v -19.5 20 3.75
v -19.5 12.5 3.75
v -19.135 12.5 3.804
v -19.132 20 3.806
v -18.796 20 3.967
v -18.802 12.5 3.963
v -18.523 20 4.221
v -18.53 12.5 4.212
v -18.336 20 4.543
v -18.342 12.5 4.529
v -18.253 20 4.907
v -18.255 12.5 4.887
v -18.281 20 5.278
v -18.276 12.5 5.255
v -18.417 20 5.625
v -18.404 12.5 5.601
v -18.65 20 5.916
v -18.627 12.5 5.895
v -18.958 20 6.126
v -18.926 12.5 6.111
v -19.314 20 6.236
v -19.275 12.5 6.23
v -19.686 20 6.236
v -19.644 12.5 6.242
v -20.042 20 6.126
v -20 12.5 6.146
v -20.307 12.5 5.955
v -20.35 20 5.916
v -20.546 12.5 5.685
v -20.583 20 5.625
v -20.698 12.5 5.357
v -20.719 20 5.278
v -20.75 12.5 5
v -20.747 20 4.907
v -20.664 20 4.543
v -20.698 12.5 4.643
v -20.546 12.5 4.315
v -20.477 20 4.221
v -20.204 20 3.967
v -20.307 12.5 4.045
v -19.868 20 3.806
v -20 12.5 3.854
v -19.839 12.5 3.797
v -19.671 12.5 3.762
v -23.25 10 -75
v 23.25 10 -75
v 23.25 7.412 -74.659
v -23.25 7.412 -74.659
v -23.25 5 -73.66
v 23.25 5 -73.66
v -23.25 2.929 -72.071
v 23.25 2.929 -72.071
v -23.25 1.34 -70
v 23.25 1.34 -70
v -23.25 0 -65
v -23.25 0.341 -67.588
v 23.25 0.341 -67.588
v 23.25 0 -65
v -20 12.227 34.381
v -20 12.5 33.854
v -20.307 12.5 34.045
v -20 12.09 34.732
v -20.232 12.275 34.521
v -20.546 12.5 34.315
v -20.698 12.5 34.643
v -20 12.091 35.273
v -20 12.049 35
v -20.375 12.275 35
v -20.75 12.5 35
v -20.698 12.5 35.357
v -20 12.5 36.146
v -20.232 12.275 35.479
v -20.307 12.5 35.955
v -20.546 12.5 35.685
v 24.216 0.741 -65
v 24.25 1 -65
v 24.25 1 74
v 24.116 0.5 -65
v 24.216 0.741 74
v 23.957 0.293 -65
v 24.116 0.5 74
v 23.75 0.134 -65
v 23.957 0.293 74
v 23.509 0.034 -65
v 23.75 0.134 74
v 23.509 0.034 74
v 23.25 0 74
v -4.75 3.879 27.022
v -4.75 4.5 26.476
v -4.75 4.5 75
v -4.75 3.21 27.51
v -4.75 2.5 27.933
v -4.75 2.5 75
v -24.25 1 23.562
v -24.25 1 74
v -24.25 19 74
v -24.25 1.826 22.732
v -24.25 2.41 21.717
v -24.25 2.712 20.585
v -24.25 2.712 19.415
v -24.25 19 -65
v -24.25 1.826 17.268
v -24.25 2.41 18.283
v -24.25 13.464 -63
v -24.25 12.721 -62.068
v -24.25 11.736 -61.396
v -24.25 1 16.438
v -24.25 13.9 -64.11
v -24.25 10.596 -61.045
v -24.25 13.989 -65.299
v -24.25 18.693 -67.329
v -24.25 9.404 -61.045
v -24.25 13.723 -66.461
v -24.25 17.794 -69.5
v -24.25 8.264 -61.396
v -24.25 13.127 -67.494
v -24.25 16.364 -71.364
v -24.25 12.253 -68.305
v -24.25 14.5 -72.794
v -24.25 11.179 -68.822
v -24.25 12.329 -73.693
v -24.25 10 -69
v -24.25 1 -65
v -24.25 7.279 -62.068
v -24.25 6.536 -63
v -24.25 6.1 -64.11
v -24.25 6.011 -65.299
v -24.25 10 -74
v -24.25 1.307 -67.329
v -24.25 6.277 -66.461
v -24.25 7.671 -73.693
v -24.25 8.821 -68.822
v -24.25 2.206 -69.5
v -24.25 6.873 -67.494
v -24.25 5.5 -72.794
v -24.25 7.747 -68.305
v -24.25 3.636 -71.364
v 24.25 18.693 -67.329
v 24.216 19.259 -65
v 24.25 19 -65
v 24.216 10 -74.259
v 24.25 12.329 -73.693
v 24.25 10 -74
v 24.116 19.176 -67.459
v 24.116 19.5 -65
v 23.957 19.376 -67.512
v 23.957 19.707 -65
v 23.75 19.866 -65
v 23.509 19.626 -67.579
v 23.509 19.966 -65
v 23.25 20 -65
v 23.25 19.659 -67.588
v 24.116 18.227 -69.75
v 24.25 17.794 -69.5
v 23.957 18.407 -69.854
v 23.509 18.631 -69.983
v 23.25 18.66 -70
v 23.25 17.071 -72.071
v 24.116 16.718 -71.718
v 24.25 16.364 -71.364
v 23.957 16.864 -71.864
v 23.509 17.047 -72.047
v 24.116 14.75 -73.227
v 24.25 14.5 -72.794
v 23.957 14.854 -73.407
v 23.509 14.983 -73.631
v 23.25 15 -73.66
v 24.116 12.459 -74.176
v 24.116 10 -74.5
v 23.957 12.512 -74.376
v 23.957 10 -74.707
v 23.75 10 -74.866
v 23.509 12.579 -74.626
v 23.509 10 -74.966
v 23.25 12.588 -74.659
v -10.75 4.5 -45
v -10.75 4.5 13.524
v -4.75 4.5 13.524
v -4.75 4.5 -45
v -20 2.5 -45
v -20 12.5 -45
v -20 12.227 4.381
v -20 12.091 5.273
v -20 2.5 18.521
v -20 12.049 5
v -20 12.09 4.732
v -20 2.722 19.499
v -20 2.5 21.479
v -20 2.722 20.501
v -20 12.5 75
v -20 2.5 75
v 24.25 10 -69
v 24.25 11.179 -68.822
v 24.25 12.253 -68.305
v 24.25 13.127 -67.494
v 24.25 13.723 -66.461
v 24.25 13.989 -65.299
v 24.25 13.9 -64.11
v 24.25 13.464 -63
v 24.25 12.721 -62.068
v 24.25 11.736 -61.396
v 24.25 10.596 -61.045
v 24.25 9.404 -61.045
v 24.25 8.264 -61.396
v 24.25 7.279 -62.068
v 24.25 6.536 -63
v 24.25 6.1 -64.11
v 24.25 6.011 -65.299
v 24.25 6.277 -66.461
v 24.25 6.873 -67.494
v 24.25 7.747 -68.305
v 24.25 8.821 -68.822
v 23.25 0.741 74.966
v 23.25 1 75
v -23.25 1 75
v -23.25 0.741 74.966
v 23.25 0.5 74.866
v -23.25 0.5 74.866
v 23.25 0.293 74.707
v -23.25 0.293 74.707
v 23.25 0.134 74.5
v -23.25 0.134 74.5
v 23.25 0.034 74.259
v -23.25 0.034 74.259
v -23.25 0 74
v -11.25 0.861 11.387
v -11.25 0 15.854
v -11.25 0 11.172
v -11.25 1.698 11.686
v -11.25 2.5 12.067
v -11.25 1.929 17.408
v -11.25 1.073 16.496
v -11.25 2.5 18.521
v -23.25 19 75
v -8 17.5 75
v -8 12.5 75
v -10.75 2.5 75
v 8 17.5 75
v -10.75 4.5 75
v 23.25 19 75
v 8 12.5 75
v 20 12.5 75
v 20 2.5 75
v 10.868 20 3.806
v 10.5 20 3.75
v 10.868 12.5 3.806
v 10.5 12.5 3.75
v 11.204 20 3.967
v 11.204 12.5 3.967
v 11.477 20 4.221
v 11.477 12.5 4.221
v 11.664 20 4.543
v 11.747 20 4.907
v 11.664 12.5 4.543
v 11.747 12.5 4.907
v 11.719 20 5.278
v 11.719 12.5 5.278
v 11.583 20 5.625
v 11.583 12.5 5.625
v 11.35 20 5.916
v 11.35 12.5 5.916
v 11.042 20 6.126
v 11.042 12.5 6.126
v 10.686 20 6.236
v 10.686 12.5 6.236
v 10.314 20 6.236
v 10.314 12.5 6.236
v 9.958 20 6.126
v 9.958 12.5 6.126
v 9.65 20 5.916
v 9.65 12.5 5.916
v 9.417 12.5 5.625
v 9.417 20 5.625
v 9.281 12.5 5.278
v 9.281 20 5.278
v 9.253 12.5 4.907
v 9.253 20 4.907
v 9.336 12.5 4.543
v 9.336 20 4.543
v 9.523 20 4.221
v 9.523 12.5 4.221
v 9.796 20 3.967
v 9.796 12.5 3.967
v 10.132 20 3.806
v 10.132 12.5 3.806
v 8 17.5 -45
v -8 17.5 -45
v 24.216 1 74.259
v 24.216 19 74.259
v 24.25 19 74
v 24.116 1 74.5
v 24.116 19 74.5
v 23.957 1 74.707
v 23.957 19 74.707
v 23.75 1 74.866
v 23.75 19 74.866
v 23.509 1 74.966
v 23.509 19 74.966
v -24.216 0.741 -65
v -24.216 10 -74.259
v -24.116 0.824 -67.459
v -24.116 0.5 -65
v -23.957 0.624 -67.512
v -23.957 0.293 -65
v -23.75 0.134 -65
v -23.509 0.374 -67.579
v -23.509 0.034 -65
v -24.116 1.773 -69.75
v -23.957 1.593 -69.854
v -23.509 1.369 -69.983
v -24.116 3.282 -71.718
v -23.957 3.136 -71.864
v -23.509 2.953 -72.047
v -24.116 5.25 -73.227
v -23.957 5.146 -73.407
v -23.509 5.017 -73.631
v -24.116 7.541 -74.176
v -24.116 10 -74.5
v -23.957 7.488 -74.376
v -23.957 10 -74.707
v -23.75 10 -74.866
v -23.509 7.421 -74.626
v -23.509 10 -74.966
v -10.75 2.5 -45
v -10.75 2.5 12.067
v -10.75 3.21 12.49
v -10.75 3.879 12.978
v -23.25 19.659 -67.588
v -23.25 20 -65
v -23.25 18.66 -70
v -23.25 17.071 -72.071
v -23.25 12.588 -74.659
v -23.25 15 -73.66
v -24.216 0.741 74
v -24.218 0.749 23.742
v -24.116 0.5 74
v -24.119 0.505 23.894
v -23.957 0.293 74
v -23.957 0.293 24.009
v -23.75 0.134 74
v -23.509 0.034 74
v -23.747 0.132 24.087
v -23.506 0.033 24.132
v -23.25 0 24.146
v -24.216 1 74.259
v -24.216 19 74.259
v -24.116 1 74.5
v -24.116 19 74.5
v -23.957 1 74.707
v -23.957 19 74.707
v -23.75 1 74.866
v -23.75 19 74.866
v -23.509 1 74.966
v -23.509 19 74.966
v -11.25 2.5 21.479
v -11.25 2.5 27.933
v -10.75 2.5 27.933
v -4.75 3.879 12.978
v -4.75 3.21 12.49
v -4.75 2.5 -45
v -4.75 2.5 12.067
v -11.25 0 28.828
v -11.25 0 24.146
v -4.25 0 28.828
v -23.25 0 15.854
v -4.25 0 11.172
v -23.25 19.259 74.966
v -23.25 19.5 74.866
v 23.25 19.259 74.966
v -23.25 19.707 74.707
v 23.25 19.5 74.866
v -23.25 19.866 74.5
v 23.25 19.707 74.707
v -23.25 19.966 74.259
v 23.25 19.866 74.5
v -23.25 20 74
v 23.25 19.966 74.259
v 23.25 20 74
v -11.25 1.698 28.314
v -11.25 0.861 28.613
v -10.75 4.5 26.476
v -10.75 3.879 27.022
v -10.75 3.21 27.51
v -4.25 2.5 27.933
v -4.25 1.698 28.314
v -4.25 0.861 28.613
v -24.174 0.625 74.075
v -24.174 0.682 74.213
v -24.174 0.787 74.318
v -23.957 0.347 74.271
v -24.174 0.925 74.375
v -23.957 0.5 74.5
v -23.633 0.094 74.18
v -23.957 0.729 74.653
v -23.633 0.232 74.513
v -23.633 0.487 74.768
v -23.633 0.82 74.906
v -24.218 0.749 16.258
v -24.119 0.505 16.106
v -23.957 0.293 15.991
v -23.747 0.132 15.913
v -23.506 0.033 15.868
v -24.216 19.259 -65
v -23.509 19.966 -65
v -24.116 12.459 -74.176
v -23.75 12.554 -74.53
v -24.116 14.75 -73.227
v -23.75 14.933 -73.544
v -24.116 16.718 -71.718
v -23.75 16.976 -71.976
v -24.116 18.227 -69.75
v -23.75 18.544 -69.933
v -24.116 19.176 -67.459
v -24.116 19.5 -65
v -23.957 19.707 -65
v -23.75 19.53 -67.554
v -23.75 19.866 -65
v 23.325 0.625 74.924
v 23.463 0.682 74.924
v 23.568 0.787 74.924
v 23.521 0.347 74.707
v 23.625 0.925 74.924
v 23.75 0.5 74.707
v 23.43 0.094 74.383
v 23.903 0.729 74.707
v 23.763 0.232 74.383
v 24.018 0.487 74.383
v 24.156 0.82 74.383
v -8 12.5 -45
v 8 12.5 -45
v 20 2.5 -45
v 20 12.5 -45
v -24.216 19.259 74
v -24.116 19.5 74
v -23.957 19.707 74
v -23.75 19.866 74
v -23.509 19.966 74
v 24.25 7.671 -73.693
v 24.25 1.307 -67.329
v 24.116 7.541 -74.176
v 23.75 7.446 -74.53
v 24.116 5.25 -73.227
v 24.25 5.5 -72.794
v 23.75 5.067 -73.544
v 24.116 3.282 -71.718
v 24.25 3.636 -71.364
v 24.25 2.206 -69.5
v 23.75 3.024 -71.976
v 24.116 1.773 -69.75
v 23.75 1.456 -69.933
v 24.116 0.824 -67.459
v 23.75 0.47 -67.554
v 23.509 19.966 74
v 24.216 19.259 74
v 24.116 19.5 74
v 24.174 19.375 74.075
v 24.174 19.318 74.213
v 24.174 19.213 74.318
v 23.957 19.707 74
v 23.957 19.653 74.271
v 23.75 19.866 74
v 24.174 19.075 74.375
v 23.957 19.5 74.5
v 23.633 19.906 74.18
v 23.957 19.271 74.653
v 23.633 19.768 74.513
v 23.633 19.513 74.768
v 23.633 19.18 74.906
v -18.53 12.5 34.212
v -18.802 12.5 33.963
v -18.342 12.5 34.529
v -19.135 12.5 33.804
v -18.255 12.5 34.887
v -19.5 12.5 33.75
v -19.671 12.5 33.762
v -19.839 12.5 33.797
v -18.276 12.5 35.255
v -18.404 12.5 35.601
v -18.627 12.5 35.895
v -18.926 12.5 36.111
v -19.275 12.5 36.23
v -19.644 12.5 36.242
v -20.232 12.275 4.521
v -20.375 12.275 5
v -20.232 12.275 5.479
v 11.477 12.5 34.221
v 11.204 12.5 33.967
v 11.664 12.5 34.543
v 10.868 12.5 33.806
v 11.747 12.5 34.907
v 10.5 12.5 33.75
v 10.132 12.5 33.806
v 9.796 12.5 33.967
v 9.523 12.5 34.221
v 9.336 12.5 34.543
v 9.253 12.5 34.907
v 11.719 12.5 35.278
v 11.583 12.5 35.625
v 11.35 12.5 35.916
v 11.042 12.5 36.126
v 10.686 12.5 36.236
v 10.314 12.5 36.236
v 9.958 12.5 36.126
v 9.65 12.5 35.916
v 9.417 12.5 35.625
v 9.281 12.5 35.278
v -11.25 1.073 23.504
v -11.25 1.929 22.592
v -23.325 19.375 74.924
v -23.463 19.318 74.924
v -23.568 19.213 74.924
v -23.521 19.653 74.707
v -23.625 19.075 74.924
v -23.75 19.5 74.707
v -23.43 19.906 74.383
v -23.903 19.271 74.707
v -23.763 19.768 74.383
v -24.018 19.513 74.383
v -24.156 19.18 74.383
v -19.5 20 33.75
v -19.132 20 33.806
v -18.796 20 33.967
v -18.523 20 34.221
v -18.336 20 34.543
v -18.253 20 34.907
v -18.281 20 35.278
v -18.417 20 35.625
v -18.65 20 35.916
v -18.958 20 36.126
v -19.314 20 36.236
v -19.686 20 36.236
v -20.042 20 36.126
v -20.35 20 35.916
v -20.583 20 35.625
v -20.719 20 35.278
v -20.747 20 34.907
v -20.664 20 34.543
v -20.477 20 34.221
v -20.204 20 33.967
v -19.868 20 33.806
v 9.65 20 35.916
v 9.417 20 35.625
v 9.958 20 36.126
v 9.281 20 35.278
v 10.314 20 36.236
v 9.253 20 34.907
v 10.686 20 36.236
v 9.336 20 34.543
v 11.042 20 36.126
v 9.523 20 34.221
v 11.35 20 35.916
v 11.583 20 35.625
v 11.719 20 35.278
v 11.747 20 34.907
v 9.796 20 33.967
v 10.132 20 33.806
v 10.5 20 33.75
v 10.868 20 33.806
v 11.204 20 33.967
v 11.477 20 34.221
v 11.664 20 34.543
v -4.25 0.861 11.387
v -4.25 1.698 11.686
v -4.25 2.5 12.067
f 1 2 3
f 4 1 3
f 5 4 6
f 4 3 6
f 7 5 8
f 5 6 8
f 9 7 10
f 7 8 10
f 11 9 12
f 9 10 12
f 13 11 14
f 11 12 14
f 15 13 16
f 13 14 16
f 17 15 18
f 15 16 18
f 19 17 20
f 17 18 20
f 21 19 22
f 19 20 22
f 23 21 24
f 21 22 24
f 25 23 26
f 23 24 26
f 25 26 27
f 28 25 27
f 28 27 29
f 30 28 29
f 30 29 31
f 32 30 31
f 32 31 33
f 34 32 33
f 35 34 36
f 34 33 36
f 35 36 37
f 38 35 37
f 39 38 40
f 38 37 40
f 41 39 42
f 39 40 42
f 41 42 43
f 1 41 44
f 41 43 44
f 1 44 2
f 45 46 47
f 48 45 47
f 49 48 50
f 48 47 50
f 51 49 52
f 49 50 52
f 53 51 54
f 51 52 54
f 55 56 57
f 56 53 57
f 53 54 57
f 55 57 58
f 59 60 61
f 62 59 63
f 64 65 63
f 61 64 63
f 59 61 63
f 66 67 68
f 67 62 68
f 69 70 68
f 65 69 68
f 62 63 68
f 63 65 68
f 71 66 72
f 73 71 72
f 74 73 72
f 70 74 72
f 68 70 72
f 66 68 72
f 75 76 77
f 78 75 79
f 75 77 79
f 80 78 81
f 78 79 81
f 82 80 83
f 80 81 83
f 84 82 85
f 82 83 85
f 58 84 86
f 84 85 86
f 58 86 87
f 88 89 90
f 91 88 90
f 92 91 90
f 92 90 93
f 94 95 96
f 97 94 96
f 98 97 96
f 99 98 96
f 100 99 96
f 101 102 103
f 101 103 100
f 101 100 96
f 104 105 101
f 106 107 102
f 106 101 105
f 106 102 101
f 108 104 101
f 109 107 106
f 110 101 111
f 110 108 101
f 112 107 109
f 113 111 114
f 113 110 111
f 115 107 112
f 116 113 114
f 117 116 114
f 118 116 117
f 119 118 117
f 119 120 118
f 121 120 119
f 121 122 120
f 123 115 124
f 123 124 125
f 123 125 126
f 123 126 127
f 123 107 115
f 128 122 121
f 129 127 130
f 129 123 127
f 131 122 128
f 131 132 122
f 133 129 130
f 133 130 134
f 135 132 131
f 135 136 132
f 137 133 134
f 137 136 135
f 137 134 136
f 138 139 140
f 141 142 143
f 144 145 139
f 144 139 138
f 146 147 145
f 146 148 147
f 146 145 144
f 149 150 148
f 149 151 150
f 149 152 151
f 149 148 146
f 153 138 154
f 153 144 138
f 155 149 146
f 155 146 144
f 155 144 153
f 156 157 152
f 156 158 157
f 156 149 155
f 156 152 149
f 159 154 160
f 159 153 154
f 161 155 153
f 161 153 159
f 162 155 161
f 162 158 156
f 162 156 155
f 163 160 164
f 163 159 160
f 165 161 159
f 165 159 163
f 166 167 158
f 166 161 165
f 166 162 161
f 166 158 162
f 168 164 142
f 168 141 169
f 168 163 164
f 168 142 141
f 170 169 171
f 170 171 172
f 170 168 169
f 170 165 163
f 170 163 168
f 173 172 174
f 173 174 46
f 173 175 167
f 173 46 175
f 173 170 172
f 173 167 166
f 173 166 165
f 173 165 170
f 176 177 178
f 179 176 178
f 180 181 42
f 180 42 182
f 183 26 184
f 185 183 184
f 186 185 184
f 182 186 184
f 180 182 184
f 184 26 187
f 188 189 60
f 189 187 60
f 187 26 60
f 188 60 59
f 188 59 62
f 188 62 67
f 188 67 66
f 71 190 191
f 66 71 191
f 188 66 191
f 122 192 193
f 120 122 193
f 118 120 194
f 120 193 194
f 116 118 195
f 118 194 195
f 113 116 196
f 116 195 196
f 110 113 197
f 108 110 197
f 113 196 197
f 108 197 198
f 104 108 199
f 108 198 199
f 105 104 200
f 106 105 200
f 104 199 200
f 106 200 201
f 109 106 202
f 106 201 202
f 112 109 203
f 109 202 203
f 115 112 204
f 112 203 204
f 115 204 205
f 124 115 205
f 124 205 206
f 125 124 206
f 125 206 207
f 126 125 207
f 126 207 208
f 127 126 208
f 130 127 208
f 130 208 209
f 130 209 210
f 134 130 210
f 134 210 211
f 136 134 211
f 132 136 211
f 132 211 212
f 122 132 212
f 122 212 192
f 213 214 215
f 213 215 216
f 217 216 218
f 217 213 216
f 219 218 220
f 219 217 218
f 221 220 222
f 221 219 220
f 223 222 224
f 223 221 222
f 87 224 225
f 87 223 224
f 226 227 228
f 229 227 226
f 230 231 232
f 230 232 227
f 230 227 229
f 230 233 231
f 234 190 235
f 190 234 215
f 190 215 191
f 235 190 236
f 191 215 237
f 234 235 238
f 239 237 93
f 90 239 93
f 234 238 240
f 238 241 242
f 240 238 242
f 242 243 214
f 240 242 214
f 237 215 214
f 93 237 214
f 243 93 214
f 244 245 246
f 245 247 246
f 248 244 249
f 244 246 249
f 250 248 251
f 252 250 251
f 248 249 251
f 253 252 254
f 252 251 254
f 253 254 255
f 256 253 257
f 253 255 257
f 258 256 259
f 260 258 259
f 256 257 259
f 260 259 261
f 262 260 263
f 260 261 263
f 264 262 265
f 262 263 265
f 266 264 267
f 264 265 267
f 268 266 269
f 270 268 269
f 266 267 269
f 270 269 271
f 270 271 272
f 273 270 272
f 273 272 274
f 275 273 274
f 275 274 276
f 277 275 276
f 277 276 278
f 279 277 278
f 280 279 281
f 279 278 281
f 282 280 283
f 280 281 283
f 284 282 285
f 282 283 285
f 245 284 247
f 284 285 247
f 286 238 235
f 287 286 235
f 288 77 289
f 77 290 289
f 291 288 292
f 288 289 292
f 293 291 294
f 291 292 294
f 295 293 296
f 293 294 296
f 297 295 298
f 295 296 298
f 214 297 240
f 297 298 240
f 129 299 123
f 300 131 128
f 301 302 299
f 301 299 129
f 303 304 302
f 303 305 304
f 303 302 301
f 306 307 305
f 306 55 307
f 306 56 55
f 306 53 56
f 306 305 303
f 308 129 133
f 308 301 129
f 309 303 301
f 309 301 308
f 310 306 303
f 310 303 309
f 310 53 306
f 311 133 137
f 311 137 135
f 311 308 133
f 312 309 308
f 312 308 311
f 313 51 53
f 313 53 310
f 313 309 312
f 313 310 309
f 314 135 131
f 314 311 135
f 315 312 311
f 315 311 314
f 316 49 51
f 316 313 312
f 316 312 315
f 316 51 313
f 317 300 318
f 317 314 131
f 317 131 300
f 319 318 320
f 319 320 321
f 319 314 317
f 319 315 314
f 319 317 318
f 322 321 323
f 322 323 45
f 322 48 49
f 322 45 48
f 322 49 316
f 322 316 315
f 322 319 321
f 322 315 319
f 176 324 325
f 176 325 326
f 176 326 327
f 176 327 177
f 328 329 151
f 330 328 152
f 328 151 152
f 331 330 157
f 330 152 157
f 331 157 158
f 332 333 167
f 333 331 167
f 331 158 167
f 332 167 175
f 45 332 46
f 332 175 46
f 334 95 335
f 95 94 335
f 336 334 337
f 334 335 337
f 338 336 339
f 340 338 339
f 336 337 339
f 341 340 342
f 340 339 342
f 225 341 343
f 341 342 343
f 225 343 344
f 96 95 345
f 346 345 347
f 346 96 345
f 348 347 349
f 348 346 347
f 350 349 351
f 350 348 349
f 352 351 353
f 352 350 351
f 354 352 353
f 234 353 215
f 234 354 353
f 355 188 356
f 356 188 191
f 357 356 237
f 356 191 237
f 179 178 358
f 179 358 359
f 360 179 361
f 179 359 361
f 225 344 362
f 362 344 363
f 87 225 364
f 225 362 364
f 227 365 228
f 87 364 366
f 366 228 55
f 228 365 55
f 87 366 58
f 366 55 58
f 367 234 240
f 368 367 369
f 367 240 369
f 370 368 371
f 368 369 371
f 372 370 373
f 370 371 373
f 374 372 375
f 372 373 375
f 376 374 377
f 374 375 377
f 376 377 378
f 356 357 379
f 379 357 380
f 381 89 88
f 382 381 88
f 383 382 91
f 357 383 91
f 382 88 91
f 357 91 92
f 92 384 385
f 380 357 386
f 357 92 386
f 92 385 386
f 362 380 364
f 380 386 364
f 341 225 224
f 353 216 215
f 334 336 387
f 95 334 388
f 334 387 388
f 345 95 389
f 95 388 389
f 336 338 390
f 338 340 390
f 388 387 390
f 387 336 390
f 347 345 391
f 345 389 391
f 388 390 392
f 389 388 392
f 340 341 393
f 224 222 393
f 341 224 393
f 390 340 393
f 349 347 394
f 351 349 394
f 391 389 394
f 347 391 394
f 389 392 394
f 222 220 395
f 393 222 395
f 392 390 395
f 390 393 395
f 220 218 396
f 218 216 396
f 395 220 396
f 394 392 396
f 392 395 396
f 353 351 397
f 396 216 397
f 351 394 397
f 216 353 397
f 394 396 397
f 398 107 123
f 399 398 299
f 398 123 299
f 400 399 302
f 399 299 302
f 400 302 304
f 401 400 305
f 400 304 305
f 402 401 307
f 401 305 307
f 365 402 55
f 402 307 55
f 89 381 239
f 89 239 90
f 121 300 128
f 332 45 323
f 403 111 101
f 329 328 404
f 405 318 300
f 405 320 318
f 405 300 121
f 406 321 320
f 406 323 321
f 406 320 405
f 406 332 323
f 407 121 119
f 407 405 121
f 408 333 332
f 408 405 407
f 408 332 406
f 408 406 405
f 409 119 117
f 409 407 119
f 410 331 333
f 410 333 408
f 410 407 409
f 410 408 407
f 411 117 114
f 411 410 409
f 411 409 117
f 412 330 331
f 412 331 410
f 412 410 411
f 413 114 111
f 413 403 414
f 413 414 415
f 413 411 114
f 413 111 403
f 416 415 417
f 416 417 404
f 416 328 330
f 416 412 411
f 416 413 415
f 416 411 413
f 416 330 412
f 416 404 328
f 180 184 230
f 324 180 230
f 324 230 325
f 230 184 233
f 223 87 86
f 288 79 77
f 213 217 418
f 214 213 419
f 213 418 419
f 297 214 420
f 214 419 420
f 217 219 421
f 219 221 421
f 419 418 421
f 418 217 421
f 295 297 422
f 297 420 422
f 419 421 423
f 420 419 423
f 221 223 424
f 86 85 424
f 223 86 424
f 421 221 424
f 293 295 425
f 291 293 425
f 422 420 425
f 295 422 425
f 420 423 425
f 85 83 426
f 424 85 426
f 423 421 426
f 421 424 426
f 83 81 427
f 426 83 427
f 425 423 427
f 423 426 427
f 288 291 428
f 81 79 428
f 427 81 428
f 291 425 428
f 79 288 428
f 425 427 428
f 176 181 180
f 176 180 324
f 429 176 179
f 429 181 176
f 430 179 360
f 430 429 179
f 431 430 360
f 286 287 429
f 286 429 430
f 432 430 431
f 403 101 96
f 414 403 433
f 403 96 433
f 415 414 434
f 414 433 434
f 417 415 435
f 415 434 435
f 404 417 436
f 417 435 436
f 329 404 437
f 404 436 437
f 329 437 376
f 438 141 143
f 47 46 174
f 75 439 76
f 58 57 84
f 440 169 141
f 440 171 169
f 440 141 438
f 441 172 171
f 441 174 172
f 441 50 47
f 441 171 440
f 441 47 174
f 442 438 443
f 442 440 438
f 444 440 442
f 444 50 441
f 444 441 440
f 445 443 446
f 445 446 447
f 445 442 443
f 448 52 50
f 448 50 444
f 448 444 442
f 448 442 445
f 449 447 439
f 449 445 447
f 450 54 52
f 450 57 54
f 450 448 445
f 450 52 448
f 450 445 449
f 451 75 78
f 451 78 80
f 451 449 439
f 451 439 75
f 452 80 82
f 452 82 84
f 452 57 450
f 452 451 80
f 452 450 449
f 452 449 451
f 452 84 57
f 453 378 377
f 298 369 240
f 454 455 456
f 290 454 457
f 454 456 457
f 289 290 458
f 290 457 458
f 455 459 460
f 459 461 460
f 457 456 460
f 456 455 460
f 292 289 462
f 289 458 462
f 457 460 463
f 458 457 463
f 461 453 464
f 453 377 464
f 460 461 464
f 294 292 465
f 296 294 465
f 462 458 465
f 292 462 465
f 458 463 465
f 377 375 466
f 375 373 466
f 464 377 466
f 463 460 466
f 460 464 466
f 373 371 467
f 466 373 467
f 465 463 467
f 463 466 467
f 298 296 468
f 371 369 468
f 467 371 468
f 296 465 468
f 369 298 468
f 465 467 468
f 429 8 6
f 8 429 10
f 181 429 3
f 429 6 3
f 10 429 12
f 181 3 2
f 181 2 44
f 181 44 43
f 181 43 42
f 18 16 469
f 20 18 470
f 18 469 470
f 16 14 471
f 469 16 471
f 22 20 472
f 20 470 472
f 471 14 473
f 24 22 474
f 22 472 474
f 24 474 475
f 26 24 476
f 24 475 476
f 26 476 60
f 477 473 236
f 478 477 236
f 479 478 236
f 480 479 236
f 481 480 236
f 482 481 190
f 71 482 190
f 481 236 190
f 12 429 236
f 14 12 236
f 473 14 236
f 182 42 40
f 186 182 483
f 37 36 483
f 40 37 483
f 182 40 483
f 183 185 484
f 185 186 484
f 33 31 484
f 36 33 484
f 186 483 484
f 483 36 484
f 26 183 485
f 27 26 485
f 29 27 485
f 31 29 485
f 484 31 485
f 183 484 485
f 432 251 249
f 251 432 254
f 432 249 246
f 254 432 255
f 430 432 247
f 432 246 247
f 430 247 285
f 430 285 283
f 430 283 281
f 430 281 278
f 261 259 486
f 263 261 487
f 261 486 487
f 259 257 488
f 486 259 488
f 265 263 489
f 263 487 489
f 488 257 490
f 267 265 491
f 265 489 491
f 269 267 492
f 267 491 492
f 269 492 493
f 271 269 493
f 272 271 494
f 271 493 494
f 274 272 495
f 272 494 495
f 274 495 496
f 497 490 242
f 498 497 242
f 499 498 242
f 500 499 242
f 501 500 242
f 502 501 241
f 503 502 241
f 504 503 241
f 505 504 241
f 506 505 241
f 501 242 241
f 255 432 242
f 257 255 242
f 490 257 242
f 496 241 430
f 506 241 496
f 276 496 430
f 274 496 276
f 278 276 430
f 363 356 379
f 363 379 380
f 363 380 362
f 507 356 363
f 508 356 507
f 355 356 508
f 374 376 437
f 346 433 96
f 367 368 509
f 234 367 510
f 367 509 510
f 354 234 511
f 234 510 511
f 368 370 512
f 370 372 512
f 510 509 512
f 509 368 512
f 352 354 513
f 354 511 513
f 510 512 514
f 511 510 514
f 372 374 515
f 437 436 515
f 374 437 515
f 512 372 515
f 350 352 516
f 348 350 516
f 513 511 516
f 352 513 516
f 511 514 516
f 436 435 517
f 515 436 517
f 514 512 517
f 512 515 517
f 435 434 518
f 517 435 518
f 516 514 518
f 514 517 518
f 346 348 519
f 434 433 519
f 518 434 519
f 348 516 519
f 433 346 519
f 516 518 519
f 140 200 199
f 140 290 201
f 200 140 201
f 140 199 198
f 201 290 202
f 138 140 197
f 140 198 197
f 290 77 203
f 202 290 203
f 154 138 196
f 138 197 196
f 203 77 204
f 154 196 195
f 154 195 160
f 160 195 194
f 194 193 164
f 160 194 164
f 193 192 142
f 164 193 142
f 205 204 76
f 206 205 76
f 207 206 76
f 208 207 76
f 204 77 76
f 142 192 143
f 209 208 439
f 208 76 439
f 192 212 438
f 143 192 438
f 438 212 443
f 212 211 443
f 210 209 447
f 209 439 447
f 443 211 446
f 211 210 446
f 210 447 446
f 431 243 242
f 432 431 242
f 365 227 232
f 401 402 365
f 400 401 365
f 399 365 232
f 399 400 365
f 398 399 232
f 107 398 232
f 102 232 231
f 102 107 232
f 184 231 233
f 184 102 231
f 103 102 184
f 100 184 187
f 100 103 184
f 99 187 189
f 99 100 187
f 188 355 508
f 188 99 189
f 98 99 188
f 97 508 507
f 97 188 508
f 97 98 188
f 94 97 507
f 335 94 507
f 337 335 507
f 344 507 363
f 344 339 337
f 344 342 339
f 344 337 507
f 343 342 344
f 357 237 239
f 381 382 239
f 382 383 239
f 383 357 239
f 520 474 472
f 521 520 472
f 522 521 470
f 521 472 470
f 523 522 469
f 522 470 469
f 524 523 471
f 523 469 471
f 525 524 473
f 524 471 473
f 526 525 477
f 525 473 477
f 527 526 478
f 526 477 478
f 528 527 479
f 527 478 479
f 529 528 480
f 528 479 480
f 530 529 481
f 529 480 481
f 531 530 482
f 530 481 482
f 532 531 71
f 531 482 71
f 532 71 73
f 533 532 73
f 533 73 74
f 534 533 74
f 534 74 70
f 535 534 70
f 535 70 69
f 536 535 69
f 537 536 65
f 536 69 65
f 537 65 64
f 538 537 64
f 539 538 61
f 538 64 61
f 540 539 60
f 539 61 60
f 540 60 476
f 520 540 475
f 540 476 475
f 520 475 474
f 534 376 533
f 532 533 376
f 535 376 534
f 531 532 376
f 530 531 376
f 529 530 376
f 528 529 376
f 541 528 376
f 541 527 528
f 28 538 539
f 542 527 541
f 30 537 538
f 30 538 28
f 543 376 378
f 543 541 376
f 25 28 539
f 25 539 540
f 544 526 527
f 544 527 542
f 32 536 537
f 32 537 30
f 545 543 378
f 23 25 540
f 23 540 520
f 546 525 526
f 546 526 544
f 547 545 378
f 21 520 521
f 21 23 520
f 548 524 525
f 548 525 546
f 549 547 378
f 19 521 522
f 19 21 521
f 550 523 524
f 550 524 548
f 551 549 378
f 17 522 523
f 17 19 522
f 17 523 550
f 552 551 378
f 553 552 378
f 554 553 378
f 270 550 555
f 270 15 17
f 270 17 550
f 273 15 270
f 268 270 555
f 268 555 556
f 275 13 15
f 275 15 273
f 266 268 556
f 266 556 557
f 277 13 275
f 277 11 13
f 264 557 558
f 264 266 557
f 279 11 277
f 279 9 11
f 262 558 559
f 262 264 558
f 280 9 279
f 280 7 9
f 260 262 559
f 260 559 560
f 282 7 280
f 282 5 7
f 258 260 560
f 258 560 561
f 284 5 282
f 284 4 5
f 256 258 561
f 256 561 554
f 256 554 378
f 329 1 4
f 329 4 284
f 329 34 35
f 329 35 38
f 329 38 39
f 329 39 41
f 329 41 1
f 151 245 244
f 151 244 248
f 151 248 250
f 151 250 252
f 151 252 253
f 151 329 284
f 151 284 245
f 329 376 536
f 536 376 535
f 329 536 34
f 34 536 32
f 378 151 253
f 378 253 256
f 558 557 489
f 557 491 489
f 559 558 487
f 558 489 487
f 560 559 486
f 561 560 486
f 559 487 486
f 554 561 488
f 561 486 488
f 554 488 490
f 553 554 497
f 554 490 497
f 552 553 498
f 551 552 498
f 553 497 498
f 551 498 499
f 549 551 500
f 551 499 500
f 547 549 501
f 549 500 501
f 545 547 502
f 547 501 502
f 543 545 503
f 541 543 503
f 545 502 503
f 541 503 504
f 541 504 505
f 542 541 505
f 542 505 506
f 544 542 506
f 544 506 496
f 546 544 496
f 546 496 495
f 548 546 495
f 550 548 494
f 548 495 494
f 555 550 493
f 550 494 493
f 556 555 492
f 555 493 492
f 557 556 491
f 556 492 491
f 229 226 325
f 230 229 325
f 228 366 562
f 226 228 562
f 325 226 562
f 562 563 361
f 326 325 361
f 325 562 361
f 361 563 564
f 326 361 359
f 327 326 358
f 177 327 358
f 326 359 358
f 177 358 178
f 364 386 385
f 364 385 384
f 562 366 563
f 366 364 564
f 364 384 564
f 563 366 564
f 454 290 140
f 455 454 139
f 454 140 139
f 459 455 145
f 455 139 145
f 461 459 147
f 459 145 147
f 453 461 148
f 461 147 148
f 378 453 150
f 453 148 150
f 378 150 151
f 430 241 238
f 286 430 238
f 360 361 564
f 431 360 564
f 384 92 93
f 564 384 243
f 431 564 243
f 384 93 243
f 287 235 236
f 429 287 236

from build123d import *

# Parameters (mm, degrees)
SKETCH_1_W               = 48.5
SKETCH_1_H               = 150
EXTRUDE_1_DEPTH          = 20
CUT_EXTRUDE_1_REACH      = 93.527
CUT_EXTRUDE_2_REACH      = 93.527
SKETCH_4_R               = 4
M3X0_5_1_D               = 2.5
M3X0_5_1_DEPTH           = 7.5
M3X0_5_1_TIP             = 0.751075774
CUT_EXTRUDE_3_DEPTH      = 14
CUT_EXTRUDE_4_DEPTH      = 1
CUT_EXTRUDE_4_DEPTH_BACK = 6
CUT_EXTRUDE_5_DEPTH      = 120
FILLET_1_R               = 1


with BuildPart() as part:
    # 草图1 → 凸台-拉伸1 (new body)
    with BuildSketch(Plane(origin=(0, 0, 0), x_dir=(1, 0, 0), z_dir=(0, 1, 0))):
        Rectangle(SKETCH_1_W, SKETCH_1_H)
    extrude(amount=EXTRUDE_1_DEPTH)

    # 草图3 → 切除-拉伸1 (cut, up to next)
    with BuildSketch(Plane(origin=(24.25, 0, 0), x_dir=(0, 0, -1), z_dir=(1, 0, 0)), mode=Mode.PRIVATE) as cut_extrude_1_sk1:
        with BuildLine():
            Line((75, 0), (75, 10))
            ThreePointArc((75, 10), (72.071067812, 2.928932188), (65, 0))
            Line((65, 0), (75, 0))
        make_face()
    cut_extrude_1_tool1 = extrude(cut_extrude_1_sk1.sketch, amount=-CUT_EXTRUDE_1_REACH, mode=Mode.PRIVATE) & part.part
    # 草图3 → 切除-拉伸1 (cut, up to next)
    with BuildSketch(Plane(origin=(24.25, 0, 0), x_dir=(0, 0, -1), z_dir=(1, 0, 0)), mode=Mode.PRIVATE) as cut_extrude_1_sk2:
        with BuildLine():
            Line((75, 20), (65, 20))
            ThreePointArc((65, 20), (72.071067812, 17.071067812), (75, 10))
            Line((75, 10), (75, 20))
        make_face()
    cut_extrude_1_tool2 = extrude(cut_extrude_1_sk2.sketch, amount=-CUT_EXTRUDE_1_REACH, mode=Mode.PRIVATE) & part.part
    add(cut_extrude_1_tool1.solids().sort_by_distance((24.25, 2.233679, -72.766321))[0], mode=Mode.SUBTRACT)
    add(cut_extrude_1_tool2.solids().sort_by_distance((24.25, 17.766321, -72.766321))[0], mode=Mode.SUBTRACT)

    # 草图4 → 切除-拉伸2 (cut, up to next)
    with BuildSketch(Plane(origin=(24.25, 0, 0), x_dir=(0, 0, -1), z_dir=(1, 0, 0)), mode=Mode.PRIVATE) as cut_extrude_2_sk1:
        with Locations((65, 10)):
            Circle(SKETCH_4_R)
    cut_extrude_2_tool1 = extrude(cut_extrude_2_sk1.sketch, amount=-CUT_EXTRUDE_2_REACH, mode=Mode.PRIVATE) & part.part
    add(cut_extrude_2_tool1.solids().sort_by_distance((24.25, 10, -65))[0], mode=Mode.SUBTRACT)

    # M3x0.5 螺纹孔1
    with Locations(Plane(origin=(-19.5, 20, 5), x_dir=(0, 0, 1), z_dir=(0, 1, 0))):
        with Locations((0, 0), (0, 30), (30, 0), (30, 30)):
            Hole(M3X0_5_1_D / 2, depth=M3X0_5_1_DEPTH)
            with Locations((0, 0, -(M3X0_5_1_DEPTH + M3X0_5_1_TIP / 2))):  # 118° drill point
                Cone(0, M3X0_5_1_D / 2, M3X0_5_1_TIP, mode=Mode.SUBTRACT)

    # 草图9 → 切除-拉伸3 (cut)
    with BuildSketch(Plane.ZY.offset(24.25)):
        with BuildLine():
            Line((24.145780988, 0), (15.854219012, 0))
            ThreePointArc((15.854219012, 0), (20, 2.75), (24.145780988, 0))
        make_face()
    extrude(amount=-CUT_EXTRUDE_3_DEPTH, mode=Mode.SUBTRACT)

    # 草图10 → 切除-拉伸4 (cut, two sides: drawn at the far end of the back side and taken through both)
    with BuildSketch(Plane.ZY.offset(10.25).offset(-CUT_EXTRUDE_4_DEPTH_BACK)):
        with BuildLine():
            Line((28.828221792, 0), (11.171778209, 0))
            ThreePointArc((11.171778209, 0), (20, 7.25), (28.828221792, 0))
        make_face()
    extrude(amount=CUT_EXTRUDE_4_DEPTH + CUT_EXTRUDE_4_DEPTH_BACK, mode=Mode.SUBTRACT)

    # 草图11 → 切除-拉伸5 (cut)
    with BuildSketch(Plane.XY.offset(75)):
        Polygon((-4.7499492, 2.5), (20, 2.5), (20, 12.5), (8, 12.5), (8, 17.5), (-8, 17.5), (-8, 12.5), (-20, 12.5), (-20, 2.5), (-10.7499492, 2.5), (-10.7499492, 4.5), (-4.7499492, 4.5), align=None)
    extrude(amount=-CUT_EXTRUDE_5_DEPTH, mode=Mode.SUBTRACT)

    # 圆角1
    fillet_1_edges = [part.edges().sort_by_distance(p)[0] for p in [
        (-24.25, 0, -24.572890494),
        (0, 20, 75),
        (24.25, 10, -75),
        (-24.25, 10, -75),
        (-24.25, 20, 5),
        (24.25, 20, 5),
        (0, 0, 75),
        (-24.25, 0, 49.572890494),
        (24.25, 0, 5),
        (24.25, 10, 75),
        (-24.25, 10, 75),
    ]]
    fillet(fillet_1_edges, radius=FILLET_1_R)


solid = part.part
